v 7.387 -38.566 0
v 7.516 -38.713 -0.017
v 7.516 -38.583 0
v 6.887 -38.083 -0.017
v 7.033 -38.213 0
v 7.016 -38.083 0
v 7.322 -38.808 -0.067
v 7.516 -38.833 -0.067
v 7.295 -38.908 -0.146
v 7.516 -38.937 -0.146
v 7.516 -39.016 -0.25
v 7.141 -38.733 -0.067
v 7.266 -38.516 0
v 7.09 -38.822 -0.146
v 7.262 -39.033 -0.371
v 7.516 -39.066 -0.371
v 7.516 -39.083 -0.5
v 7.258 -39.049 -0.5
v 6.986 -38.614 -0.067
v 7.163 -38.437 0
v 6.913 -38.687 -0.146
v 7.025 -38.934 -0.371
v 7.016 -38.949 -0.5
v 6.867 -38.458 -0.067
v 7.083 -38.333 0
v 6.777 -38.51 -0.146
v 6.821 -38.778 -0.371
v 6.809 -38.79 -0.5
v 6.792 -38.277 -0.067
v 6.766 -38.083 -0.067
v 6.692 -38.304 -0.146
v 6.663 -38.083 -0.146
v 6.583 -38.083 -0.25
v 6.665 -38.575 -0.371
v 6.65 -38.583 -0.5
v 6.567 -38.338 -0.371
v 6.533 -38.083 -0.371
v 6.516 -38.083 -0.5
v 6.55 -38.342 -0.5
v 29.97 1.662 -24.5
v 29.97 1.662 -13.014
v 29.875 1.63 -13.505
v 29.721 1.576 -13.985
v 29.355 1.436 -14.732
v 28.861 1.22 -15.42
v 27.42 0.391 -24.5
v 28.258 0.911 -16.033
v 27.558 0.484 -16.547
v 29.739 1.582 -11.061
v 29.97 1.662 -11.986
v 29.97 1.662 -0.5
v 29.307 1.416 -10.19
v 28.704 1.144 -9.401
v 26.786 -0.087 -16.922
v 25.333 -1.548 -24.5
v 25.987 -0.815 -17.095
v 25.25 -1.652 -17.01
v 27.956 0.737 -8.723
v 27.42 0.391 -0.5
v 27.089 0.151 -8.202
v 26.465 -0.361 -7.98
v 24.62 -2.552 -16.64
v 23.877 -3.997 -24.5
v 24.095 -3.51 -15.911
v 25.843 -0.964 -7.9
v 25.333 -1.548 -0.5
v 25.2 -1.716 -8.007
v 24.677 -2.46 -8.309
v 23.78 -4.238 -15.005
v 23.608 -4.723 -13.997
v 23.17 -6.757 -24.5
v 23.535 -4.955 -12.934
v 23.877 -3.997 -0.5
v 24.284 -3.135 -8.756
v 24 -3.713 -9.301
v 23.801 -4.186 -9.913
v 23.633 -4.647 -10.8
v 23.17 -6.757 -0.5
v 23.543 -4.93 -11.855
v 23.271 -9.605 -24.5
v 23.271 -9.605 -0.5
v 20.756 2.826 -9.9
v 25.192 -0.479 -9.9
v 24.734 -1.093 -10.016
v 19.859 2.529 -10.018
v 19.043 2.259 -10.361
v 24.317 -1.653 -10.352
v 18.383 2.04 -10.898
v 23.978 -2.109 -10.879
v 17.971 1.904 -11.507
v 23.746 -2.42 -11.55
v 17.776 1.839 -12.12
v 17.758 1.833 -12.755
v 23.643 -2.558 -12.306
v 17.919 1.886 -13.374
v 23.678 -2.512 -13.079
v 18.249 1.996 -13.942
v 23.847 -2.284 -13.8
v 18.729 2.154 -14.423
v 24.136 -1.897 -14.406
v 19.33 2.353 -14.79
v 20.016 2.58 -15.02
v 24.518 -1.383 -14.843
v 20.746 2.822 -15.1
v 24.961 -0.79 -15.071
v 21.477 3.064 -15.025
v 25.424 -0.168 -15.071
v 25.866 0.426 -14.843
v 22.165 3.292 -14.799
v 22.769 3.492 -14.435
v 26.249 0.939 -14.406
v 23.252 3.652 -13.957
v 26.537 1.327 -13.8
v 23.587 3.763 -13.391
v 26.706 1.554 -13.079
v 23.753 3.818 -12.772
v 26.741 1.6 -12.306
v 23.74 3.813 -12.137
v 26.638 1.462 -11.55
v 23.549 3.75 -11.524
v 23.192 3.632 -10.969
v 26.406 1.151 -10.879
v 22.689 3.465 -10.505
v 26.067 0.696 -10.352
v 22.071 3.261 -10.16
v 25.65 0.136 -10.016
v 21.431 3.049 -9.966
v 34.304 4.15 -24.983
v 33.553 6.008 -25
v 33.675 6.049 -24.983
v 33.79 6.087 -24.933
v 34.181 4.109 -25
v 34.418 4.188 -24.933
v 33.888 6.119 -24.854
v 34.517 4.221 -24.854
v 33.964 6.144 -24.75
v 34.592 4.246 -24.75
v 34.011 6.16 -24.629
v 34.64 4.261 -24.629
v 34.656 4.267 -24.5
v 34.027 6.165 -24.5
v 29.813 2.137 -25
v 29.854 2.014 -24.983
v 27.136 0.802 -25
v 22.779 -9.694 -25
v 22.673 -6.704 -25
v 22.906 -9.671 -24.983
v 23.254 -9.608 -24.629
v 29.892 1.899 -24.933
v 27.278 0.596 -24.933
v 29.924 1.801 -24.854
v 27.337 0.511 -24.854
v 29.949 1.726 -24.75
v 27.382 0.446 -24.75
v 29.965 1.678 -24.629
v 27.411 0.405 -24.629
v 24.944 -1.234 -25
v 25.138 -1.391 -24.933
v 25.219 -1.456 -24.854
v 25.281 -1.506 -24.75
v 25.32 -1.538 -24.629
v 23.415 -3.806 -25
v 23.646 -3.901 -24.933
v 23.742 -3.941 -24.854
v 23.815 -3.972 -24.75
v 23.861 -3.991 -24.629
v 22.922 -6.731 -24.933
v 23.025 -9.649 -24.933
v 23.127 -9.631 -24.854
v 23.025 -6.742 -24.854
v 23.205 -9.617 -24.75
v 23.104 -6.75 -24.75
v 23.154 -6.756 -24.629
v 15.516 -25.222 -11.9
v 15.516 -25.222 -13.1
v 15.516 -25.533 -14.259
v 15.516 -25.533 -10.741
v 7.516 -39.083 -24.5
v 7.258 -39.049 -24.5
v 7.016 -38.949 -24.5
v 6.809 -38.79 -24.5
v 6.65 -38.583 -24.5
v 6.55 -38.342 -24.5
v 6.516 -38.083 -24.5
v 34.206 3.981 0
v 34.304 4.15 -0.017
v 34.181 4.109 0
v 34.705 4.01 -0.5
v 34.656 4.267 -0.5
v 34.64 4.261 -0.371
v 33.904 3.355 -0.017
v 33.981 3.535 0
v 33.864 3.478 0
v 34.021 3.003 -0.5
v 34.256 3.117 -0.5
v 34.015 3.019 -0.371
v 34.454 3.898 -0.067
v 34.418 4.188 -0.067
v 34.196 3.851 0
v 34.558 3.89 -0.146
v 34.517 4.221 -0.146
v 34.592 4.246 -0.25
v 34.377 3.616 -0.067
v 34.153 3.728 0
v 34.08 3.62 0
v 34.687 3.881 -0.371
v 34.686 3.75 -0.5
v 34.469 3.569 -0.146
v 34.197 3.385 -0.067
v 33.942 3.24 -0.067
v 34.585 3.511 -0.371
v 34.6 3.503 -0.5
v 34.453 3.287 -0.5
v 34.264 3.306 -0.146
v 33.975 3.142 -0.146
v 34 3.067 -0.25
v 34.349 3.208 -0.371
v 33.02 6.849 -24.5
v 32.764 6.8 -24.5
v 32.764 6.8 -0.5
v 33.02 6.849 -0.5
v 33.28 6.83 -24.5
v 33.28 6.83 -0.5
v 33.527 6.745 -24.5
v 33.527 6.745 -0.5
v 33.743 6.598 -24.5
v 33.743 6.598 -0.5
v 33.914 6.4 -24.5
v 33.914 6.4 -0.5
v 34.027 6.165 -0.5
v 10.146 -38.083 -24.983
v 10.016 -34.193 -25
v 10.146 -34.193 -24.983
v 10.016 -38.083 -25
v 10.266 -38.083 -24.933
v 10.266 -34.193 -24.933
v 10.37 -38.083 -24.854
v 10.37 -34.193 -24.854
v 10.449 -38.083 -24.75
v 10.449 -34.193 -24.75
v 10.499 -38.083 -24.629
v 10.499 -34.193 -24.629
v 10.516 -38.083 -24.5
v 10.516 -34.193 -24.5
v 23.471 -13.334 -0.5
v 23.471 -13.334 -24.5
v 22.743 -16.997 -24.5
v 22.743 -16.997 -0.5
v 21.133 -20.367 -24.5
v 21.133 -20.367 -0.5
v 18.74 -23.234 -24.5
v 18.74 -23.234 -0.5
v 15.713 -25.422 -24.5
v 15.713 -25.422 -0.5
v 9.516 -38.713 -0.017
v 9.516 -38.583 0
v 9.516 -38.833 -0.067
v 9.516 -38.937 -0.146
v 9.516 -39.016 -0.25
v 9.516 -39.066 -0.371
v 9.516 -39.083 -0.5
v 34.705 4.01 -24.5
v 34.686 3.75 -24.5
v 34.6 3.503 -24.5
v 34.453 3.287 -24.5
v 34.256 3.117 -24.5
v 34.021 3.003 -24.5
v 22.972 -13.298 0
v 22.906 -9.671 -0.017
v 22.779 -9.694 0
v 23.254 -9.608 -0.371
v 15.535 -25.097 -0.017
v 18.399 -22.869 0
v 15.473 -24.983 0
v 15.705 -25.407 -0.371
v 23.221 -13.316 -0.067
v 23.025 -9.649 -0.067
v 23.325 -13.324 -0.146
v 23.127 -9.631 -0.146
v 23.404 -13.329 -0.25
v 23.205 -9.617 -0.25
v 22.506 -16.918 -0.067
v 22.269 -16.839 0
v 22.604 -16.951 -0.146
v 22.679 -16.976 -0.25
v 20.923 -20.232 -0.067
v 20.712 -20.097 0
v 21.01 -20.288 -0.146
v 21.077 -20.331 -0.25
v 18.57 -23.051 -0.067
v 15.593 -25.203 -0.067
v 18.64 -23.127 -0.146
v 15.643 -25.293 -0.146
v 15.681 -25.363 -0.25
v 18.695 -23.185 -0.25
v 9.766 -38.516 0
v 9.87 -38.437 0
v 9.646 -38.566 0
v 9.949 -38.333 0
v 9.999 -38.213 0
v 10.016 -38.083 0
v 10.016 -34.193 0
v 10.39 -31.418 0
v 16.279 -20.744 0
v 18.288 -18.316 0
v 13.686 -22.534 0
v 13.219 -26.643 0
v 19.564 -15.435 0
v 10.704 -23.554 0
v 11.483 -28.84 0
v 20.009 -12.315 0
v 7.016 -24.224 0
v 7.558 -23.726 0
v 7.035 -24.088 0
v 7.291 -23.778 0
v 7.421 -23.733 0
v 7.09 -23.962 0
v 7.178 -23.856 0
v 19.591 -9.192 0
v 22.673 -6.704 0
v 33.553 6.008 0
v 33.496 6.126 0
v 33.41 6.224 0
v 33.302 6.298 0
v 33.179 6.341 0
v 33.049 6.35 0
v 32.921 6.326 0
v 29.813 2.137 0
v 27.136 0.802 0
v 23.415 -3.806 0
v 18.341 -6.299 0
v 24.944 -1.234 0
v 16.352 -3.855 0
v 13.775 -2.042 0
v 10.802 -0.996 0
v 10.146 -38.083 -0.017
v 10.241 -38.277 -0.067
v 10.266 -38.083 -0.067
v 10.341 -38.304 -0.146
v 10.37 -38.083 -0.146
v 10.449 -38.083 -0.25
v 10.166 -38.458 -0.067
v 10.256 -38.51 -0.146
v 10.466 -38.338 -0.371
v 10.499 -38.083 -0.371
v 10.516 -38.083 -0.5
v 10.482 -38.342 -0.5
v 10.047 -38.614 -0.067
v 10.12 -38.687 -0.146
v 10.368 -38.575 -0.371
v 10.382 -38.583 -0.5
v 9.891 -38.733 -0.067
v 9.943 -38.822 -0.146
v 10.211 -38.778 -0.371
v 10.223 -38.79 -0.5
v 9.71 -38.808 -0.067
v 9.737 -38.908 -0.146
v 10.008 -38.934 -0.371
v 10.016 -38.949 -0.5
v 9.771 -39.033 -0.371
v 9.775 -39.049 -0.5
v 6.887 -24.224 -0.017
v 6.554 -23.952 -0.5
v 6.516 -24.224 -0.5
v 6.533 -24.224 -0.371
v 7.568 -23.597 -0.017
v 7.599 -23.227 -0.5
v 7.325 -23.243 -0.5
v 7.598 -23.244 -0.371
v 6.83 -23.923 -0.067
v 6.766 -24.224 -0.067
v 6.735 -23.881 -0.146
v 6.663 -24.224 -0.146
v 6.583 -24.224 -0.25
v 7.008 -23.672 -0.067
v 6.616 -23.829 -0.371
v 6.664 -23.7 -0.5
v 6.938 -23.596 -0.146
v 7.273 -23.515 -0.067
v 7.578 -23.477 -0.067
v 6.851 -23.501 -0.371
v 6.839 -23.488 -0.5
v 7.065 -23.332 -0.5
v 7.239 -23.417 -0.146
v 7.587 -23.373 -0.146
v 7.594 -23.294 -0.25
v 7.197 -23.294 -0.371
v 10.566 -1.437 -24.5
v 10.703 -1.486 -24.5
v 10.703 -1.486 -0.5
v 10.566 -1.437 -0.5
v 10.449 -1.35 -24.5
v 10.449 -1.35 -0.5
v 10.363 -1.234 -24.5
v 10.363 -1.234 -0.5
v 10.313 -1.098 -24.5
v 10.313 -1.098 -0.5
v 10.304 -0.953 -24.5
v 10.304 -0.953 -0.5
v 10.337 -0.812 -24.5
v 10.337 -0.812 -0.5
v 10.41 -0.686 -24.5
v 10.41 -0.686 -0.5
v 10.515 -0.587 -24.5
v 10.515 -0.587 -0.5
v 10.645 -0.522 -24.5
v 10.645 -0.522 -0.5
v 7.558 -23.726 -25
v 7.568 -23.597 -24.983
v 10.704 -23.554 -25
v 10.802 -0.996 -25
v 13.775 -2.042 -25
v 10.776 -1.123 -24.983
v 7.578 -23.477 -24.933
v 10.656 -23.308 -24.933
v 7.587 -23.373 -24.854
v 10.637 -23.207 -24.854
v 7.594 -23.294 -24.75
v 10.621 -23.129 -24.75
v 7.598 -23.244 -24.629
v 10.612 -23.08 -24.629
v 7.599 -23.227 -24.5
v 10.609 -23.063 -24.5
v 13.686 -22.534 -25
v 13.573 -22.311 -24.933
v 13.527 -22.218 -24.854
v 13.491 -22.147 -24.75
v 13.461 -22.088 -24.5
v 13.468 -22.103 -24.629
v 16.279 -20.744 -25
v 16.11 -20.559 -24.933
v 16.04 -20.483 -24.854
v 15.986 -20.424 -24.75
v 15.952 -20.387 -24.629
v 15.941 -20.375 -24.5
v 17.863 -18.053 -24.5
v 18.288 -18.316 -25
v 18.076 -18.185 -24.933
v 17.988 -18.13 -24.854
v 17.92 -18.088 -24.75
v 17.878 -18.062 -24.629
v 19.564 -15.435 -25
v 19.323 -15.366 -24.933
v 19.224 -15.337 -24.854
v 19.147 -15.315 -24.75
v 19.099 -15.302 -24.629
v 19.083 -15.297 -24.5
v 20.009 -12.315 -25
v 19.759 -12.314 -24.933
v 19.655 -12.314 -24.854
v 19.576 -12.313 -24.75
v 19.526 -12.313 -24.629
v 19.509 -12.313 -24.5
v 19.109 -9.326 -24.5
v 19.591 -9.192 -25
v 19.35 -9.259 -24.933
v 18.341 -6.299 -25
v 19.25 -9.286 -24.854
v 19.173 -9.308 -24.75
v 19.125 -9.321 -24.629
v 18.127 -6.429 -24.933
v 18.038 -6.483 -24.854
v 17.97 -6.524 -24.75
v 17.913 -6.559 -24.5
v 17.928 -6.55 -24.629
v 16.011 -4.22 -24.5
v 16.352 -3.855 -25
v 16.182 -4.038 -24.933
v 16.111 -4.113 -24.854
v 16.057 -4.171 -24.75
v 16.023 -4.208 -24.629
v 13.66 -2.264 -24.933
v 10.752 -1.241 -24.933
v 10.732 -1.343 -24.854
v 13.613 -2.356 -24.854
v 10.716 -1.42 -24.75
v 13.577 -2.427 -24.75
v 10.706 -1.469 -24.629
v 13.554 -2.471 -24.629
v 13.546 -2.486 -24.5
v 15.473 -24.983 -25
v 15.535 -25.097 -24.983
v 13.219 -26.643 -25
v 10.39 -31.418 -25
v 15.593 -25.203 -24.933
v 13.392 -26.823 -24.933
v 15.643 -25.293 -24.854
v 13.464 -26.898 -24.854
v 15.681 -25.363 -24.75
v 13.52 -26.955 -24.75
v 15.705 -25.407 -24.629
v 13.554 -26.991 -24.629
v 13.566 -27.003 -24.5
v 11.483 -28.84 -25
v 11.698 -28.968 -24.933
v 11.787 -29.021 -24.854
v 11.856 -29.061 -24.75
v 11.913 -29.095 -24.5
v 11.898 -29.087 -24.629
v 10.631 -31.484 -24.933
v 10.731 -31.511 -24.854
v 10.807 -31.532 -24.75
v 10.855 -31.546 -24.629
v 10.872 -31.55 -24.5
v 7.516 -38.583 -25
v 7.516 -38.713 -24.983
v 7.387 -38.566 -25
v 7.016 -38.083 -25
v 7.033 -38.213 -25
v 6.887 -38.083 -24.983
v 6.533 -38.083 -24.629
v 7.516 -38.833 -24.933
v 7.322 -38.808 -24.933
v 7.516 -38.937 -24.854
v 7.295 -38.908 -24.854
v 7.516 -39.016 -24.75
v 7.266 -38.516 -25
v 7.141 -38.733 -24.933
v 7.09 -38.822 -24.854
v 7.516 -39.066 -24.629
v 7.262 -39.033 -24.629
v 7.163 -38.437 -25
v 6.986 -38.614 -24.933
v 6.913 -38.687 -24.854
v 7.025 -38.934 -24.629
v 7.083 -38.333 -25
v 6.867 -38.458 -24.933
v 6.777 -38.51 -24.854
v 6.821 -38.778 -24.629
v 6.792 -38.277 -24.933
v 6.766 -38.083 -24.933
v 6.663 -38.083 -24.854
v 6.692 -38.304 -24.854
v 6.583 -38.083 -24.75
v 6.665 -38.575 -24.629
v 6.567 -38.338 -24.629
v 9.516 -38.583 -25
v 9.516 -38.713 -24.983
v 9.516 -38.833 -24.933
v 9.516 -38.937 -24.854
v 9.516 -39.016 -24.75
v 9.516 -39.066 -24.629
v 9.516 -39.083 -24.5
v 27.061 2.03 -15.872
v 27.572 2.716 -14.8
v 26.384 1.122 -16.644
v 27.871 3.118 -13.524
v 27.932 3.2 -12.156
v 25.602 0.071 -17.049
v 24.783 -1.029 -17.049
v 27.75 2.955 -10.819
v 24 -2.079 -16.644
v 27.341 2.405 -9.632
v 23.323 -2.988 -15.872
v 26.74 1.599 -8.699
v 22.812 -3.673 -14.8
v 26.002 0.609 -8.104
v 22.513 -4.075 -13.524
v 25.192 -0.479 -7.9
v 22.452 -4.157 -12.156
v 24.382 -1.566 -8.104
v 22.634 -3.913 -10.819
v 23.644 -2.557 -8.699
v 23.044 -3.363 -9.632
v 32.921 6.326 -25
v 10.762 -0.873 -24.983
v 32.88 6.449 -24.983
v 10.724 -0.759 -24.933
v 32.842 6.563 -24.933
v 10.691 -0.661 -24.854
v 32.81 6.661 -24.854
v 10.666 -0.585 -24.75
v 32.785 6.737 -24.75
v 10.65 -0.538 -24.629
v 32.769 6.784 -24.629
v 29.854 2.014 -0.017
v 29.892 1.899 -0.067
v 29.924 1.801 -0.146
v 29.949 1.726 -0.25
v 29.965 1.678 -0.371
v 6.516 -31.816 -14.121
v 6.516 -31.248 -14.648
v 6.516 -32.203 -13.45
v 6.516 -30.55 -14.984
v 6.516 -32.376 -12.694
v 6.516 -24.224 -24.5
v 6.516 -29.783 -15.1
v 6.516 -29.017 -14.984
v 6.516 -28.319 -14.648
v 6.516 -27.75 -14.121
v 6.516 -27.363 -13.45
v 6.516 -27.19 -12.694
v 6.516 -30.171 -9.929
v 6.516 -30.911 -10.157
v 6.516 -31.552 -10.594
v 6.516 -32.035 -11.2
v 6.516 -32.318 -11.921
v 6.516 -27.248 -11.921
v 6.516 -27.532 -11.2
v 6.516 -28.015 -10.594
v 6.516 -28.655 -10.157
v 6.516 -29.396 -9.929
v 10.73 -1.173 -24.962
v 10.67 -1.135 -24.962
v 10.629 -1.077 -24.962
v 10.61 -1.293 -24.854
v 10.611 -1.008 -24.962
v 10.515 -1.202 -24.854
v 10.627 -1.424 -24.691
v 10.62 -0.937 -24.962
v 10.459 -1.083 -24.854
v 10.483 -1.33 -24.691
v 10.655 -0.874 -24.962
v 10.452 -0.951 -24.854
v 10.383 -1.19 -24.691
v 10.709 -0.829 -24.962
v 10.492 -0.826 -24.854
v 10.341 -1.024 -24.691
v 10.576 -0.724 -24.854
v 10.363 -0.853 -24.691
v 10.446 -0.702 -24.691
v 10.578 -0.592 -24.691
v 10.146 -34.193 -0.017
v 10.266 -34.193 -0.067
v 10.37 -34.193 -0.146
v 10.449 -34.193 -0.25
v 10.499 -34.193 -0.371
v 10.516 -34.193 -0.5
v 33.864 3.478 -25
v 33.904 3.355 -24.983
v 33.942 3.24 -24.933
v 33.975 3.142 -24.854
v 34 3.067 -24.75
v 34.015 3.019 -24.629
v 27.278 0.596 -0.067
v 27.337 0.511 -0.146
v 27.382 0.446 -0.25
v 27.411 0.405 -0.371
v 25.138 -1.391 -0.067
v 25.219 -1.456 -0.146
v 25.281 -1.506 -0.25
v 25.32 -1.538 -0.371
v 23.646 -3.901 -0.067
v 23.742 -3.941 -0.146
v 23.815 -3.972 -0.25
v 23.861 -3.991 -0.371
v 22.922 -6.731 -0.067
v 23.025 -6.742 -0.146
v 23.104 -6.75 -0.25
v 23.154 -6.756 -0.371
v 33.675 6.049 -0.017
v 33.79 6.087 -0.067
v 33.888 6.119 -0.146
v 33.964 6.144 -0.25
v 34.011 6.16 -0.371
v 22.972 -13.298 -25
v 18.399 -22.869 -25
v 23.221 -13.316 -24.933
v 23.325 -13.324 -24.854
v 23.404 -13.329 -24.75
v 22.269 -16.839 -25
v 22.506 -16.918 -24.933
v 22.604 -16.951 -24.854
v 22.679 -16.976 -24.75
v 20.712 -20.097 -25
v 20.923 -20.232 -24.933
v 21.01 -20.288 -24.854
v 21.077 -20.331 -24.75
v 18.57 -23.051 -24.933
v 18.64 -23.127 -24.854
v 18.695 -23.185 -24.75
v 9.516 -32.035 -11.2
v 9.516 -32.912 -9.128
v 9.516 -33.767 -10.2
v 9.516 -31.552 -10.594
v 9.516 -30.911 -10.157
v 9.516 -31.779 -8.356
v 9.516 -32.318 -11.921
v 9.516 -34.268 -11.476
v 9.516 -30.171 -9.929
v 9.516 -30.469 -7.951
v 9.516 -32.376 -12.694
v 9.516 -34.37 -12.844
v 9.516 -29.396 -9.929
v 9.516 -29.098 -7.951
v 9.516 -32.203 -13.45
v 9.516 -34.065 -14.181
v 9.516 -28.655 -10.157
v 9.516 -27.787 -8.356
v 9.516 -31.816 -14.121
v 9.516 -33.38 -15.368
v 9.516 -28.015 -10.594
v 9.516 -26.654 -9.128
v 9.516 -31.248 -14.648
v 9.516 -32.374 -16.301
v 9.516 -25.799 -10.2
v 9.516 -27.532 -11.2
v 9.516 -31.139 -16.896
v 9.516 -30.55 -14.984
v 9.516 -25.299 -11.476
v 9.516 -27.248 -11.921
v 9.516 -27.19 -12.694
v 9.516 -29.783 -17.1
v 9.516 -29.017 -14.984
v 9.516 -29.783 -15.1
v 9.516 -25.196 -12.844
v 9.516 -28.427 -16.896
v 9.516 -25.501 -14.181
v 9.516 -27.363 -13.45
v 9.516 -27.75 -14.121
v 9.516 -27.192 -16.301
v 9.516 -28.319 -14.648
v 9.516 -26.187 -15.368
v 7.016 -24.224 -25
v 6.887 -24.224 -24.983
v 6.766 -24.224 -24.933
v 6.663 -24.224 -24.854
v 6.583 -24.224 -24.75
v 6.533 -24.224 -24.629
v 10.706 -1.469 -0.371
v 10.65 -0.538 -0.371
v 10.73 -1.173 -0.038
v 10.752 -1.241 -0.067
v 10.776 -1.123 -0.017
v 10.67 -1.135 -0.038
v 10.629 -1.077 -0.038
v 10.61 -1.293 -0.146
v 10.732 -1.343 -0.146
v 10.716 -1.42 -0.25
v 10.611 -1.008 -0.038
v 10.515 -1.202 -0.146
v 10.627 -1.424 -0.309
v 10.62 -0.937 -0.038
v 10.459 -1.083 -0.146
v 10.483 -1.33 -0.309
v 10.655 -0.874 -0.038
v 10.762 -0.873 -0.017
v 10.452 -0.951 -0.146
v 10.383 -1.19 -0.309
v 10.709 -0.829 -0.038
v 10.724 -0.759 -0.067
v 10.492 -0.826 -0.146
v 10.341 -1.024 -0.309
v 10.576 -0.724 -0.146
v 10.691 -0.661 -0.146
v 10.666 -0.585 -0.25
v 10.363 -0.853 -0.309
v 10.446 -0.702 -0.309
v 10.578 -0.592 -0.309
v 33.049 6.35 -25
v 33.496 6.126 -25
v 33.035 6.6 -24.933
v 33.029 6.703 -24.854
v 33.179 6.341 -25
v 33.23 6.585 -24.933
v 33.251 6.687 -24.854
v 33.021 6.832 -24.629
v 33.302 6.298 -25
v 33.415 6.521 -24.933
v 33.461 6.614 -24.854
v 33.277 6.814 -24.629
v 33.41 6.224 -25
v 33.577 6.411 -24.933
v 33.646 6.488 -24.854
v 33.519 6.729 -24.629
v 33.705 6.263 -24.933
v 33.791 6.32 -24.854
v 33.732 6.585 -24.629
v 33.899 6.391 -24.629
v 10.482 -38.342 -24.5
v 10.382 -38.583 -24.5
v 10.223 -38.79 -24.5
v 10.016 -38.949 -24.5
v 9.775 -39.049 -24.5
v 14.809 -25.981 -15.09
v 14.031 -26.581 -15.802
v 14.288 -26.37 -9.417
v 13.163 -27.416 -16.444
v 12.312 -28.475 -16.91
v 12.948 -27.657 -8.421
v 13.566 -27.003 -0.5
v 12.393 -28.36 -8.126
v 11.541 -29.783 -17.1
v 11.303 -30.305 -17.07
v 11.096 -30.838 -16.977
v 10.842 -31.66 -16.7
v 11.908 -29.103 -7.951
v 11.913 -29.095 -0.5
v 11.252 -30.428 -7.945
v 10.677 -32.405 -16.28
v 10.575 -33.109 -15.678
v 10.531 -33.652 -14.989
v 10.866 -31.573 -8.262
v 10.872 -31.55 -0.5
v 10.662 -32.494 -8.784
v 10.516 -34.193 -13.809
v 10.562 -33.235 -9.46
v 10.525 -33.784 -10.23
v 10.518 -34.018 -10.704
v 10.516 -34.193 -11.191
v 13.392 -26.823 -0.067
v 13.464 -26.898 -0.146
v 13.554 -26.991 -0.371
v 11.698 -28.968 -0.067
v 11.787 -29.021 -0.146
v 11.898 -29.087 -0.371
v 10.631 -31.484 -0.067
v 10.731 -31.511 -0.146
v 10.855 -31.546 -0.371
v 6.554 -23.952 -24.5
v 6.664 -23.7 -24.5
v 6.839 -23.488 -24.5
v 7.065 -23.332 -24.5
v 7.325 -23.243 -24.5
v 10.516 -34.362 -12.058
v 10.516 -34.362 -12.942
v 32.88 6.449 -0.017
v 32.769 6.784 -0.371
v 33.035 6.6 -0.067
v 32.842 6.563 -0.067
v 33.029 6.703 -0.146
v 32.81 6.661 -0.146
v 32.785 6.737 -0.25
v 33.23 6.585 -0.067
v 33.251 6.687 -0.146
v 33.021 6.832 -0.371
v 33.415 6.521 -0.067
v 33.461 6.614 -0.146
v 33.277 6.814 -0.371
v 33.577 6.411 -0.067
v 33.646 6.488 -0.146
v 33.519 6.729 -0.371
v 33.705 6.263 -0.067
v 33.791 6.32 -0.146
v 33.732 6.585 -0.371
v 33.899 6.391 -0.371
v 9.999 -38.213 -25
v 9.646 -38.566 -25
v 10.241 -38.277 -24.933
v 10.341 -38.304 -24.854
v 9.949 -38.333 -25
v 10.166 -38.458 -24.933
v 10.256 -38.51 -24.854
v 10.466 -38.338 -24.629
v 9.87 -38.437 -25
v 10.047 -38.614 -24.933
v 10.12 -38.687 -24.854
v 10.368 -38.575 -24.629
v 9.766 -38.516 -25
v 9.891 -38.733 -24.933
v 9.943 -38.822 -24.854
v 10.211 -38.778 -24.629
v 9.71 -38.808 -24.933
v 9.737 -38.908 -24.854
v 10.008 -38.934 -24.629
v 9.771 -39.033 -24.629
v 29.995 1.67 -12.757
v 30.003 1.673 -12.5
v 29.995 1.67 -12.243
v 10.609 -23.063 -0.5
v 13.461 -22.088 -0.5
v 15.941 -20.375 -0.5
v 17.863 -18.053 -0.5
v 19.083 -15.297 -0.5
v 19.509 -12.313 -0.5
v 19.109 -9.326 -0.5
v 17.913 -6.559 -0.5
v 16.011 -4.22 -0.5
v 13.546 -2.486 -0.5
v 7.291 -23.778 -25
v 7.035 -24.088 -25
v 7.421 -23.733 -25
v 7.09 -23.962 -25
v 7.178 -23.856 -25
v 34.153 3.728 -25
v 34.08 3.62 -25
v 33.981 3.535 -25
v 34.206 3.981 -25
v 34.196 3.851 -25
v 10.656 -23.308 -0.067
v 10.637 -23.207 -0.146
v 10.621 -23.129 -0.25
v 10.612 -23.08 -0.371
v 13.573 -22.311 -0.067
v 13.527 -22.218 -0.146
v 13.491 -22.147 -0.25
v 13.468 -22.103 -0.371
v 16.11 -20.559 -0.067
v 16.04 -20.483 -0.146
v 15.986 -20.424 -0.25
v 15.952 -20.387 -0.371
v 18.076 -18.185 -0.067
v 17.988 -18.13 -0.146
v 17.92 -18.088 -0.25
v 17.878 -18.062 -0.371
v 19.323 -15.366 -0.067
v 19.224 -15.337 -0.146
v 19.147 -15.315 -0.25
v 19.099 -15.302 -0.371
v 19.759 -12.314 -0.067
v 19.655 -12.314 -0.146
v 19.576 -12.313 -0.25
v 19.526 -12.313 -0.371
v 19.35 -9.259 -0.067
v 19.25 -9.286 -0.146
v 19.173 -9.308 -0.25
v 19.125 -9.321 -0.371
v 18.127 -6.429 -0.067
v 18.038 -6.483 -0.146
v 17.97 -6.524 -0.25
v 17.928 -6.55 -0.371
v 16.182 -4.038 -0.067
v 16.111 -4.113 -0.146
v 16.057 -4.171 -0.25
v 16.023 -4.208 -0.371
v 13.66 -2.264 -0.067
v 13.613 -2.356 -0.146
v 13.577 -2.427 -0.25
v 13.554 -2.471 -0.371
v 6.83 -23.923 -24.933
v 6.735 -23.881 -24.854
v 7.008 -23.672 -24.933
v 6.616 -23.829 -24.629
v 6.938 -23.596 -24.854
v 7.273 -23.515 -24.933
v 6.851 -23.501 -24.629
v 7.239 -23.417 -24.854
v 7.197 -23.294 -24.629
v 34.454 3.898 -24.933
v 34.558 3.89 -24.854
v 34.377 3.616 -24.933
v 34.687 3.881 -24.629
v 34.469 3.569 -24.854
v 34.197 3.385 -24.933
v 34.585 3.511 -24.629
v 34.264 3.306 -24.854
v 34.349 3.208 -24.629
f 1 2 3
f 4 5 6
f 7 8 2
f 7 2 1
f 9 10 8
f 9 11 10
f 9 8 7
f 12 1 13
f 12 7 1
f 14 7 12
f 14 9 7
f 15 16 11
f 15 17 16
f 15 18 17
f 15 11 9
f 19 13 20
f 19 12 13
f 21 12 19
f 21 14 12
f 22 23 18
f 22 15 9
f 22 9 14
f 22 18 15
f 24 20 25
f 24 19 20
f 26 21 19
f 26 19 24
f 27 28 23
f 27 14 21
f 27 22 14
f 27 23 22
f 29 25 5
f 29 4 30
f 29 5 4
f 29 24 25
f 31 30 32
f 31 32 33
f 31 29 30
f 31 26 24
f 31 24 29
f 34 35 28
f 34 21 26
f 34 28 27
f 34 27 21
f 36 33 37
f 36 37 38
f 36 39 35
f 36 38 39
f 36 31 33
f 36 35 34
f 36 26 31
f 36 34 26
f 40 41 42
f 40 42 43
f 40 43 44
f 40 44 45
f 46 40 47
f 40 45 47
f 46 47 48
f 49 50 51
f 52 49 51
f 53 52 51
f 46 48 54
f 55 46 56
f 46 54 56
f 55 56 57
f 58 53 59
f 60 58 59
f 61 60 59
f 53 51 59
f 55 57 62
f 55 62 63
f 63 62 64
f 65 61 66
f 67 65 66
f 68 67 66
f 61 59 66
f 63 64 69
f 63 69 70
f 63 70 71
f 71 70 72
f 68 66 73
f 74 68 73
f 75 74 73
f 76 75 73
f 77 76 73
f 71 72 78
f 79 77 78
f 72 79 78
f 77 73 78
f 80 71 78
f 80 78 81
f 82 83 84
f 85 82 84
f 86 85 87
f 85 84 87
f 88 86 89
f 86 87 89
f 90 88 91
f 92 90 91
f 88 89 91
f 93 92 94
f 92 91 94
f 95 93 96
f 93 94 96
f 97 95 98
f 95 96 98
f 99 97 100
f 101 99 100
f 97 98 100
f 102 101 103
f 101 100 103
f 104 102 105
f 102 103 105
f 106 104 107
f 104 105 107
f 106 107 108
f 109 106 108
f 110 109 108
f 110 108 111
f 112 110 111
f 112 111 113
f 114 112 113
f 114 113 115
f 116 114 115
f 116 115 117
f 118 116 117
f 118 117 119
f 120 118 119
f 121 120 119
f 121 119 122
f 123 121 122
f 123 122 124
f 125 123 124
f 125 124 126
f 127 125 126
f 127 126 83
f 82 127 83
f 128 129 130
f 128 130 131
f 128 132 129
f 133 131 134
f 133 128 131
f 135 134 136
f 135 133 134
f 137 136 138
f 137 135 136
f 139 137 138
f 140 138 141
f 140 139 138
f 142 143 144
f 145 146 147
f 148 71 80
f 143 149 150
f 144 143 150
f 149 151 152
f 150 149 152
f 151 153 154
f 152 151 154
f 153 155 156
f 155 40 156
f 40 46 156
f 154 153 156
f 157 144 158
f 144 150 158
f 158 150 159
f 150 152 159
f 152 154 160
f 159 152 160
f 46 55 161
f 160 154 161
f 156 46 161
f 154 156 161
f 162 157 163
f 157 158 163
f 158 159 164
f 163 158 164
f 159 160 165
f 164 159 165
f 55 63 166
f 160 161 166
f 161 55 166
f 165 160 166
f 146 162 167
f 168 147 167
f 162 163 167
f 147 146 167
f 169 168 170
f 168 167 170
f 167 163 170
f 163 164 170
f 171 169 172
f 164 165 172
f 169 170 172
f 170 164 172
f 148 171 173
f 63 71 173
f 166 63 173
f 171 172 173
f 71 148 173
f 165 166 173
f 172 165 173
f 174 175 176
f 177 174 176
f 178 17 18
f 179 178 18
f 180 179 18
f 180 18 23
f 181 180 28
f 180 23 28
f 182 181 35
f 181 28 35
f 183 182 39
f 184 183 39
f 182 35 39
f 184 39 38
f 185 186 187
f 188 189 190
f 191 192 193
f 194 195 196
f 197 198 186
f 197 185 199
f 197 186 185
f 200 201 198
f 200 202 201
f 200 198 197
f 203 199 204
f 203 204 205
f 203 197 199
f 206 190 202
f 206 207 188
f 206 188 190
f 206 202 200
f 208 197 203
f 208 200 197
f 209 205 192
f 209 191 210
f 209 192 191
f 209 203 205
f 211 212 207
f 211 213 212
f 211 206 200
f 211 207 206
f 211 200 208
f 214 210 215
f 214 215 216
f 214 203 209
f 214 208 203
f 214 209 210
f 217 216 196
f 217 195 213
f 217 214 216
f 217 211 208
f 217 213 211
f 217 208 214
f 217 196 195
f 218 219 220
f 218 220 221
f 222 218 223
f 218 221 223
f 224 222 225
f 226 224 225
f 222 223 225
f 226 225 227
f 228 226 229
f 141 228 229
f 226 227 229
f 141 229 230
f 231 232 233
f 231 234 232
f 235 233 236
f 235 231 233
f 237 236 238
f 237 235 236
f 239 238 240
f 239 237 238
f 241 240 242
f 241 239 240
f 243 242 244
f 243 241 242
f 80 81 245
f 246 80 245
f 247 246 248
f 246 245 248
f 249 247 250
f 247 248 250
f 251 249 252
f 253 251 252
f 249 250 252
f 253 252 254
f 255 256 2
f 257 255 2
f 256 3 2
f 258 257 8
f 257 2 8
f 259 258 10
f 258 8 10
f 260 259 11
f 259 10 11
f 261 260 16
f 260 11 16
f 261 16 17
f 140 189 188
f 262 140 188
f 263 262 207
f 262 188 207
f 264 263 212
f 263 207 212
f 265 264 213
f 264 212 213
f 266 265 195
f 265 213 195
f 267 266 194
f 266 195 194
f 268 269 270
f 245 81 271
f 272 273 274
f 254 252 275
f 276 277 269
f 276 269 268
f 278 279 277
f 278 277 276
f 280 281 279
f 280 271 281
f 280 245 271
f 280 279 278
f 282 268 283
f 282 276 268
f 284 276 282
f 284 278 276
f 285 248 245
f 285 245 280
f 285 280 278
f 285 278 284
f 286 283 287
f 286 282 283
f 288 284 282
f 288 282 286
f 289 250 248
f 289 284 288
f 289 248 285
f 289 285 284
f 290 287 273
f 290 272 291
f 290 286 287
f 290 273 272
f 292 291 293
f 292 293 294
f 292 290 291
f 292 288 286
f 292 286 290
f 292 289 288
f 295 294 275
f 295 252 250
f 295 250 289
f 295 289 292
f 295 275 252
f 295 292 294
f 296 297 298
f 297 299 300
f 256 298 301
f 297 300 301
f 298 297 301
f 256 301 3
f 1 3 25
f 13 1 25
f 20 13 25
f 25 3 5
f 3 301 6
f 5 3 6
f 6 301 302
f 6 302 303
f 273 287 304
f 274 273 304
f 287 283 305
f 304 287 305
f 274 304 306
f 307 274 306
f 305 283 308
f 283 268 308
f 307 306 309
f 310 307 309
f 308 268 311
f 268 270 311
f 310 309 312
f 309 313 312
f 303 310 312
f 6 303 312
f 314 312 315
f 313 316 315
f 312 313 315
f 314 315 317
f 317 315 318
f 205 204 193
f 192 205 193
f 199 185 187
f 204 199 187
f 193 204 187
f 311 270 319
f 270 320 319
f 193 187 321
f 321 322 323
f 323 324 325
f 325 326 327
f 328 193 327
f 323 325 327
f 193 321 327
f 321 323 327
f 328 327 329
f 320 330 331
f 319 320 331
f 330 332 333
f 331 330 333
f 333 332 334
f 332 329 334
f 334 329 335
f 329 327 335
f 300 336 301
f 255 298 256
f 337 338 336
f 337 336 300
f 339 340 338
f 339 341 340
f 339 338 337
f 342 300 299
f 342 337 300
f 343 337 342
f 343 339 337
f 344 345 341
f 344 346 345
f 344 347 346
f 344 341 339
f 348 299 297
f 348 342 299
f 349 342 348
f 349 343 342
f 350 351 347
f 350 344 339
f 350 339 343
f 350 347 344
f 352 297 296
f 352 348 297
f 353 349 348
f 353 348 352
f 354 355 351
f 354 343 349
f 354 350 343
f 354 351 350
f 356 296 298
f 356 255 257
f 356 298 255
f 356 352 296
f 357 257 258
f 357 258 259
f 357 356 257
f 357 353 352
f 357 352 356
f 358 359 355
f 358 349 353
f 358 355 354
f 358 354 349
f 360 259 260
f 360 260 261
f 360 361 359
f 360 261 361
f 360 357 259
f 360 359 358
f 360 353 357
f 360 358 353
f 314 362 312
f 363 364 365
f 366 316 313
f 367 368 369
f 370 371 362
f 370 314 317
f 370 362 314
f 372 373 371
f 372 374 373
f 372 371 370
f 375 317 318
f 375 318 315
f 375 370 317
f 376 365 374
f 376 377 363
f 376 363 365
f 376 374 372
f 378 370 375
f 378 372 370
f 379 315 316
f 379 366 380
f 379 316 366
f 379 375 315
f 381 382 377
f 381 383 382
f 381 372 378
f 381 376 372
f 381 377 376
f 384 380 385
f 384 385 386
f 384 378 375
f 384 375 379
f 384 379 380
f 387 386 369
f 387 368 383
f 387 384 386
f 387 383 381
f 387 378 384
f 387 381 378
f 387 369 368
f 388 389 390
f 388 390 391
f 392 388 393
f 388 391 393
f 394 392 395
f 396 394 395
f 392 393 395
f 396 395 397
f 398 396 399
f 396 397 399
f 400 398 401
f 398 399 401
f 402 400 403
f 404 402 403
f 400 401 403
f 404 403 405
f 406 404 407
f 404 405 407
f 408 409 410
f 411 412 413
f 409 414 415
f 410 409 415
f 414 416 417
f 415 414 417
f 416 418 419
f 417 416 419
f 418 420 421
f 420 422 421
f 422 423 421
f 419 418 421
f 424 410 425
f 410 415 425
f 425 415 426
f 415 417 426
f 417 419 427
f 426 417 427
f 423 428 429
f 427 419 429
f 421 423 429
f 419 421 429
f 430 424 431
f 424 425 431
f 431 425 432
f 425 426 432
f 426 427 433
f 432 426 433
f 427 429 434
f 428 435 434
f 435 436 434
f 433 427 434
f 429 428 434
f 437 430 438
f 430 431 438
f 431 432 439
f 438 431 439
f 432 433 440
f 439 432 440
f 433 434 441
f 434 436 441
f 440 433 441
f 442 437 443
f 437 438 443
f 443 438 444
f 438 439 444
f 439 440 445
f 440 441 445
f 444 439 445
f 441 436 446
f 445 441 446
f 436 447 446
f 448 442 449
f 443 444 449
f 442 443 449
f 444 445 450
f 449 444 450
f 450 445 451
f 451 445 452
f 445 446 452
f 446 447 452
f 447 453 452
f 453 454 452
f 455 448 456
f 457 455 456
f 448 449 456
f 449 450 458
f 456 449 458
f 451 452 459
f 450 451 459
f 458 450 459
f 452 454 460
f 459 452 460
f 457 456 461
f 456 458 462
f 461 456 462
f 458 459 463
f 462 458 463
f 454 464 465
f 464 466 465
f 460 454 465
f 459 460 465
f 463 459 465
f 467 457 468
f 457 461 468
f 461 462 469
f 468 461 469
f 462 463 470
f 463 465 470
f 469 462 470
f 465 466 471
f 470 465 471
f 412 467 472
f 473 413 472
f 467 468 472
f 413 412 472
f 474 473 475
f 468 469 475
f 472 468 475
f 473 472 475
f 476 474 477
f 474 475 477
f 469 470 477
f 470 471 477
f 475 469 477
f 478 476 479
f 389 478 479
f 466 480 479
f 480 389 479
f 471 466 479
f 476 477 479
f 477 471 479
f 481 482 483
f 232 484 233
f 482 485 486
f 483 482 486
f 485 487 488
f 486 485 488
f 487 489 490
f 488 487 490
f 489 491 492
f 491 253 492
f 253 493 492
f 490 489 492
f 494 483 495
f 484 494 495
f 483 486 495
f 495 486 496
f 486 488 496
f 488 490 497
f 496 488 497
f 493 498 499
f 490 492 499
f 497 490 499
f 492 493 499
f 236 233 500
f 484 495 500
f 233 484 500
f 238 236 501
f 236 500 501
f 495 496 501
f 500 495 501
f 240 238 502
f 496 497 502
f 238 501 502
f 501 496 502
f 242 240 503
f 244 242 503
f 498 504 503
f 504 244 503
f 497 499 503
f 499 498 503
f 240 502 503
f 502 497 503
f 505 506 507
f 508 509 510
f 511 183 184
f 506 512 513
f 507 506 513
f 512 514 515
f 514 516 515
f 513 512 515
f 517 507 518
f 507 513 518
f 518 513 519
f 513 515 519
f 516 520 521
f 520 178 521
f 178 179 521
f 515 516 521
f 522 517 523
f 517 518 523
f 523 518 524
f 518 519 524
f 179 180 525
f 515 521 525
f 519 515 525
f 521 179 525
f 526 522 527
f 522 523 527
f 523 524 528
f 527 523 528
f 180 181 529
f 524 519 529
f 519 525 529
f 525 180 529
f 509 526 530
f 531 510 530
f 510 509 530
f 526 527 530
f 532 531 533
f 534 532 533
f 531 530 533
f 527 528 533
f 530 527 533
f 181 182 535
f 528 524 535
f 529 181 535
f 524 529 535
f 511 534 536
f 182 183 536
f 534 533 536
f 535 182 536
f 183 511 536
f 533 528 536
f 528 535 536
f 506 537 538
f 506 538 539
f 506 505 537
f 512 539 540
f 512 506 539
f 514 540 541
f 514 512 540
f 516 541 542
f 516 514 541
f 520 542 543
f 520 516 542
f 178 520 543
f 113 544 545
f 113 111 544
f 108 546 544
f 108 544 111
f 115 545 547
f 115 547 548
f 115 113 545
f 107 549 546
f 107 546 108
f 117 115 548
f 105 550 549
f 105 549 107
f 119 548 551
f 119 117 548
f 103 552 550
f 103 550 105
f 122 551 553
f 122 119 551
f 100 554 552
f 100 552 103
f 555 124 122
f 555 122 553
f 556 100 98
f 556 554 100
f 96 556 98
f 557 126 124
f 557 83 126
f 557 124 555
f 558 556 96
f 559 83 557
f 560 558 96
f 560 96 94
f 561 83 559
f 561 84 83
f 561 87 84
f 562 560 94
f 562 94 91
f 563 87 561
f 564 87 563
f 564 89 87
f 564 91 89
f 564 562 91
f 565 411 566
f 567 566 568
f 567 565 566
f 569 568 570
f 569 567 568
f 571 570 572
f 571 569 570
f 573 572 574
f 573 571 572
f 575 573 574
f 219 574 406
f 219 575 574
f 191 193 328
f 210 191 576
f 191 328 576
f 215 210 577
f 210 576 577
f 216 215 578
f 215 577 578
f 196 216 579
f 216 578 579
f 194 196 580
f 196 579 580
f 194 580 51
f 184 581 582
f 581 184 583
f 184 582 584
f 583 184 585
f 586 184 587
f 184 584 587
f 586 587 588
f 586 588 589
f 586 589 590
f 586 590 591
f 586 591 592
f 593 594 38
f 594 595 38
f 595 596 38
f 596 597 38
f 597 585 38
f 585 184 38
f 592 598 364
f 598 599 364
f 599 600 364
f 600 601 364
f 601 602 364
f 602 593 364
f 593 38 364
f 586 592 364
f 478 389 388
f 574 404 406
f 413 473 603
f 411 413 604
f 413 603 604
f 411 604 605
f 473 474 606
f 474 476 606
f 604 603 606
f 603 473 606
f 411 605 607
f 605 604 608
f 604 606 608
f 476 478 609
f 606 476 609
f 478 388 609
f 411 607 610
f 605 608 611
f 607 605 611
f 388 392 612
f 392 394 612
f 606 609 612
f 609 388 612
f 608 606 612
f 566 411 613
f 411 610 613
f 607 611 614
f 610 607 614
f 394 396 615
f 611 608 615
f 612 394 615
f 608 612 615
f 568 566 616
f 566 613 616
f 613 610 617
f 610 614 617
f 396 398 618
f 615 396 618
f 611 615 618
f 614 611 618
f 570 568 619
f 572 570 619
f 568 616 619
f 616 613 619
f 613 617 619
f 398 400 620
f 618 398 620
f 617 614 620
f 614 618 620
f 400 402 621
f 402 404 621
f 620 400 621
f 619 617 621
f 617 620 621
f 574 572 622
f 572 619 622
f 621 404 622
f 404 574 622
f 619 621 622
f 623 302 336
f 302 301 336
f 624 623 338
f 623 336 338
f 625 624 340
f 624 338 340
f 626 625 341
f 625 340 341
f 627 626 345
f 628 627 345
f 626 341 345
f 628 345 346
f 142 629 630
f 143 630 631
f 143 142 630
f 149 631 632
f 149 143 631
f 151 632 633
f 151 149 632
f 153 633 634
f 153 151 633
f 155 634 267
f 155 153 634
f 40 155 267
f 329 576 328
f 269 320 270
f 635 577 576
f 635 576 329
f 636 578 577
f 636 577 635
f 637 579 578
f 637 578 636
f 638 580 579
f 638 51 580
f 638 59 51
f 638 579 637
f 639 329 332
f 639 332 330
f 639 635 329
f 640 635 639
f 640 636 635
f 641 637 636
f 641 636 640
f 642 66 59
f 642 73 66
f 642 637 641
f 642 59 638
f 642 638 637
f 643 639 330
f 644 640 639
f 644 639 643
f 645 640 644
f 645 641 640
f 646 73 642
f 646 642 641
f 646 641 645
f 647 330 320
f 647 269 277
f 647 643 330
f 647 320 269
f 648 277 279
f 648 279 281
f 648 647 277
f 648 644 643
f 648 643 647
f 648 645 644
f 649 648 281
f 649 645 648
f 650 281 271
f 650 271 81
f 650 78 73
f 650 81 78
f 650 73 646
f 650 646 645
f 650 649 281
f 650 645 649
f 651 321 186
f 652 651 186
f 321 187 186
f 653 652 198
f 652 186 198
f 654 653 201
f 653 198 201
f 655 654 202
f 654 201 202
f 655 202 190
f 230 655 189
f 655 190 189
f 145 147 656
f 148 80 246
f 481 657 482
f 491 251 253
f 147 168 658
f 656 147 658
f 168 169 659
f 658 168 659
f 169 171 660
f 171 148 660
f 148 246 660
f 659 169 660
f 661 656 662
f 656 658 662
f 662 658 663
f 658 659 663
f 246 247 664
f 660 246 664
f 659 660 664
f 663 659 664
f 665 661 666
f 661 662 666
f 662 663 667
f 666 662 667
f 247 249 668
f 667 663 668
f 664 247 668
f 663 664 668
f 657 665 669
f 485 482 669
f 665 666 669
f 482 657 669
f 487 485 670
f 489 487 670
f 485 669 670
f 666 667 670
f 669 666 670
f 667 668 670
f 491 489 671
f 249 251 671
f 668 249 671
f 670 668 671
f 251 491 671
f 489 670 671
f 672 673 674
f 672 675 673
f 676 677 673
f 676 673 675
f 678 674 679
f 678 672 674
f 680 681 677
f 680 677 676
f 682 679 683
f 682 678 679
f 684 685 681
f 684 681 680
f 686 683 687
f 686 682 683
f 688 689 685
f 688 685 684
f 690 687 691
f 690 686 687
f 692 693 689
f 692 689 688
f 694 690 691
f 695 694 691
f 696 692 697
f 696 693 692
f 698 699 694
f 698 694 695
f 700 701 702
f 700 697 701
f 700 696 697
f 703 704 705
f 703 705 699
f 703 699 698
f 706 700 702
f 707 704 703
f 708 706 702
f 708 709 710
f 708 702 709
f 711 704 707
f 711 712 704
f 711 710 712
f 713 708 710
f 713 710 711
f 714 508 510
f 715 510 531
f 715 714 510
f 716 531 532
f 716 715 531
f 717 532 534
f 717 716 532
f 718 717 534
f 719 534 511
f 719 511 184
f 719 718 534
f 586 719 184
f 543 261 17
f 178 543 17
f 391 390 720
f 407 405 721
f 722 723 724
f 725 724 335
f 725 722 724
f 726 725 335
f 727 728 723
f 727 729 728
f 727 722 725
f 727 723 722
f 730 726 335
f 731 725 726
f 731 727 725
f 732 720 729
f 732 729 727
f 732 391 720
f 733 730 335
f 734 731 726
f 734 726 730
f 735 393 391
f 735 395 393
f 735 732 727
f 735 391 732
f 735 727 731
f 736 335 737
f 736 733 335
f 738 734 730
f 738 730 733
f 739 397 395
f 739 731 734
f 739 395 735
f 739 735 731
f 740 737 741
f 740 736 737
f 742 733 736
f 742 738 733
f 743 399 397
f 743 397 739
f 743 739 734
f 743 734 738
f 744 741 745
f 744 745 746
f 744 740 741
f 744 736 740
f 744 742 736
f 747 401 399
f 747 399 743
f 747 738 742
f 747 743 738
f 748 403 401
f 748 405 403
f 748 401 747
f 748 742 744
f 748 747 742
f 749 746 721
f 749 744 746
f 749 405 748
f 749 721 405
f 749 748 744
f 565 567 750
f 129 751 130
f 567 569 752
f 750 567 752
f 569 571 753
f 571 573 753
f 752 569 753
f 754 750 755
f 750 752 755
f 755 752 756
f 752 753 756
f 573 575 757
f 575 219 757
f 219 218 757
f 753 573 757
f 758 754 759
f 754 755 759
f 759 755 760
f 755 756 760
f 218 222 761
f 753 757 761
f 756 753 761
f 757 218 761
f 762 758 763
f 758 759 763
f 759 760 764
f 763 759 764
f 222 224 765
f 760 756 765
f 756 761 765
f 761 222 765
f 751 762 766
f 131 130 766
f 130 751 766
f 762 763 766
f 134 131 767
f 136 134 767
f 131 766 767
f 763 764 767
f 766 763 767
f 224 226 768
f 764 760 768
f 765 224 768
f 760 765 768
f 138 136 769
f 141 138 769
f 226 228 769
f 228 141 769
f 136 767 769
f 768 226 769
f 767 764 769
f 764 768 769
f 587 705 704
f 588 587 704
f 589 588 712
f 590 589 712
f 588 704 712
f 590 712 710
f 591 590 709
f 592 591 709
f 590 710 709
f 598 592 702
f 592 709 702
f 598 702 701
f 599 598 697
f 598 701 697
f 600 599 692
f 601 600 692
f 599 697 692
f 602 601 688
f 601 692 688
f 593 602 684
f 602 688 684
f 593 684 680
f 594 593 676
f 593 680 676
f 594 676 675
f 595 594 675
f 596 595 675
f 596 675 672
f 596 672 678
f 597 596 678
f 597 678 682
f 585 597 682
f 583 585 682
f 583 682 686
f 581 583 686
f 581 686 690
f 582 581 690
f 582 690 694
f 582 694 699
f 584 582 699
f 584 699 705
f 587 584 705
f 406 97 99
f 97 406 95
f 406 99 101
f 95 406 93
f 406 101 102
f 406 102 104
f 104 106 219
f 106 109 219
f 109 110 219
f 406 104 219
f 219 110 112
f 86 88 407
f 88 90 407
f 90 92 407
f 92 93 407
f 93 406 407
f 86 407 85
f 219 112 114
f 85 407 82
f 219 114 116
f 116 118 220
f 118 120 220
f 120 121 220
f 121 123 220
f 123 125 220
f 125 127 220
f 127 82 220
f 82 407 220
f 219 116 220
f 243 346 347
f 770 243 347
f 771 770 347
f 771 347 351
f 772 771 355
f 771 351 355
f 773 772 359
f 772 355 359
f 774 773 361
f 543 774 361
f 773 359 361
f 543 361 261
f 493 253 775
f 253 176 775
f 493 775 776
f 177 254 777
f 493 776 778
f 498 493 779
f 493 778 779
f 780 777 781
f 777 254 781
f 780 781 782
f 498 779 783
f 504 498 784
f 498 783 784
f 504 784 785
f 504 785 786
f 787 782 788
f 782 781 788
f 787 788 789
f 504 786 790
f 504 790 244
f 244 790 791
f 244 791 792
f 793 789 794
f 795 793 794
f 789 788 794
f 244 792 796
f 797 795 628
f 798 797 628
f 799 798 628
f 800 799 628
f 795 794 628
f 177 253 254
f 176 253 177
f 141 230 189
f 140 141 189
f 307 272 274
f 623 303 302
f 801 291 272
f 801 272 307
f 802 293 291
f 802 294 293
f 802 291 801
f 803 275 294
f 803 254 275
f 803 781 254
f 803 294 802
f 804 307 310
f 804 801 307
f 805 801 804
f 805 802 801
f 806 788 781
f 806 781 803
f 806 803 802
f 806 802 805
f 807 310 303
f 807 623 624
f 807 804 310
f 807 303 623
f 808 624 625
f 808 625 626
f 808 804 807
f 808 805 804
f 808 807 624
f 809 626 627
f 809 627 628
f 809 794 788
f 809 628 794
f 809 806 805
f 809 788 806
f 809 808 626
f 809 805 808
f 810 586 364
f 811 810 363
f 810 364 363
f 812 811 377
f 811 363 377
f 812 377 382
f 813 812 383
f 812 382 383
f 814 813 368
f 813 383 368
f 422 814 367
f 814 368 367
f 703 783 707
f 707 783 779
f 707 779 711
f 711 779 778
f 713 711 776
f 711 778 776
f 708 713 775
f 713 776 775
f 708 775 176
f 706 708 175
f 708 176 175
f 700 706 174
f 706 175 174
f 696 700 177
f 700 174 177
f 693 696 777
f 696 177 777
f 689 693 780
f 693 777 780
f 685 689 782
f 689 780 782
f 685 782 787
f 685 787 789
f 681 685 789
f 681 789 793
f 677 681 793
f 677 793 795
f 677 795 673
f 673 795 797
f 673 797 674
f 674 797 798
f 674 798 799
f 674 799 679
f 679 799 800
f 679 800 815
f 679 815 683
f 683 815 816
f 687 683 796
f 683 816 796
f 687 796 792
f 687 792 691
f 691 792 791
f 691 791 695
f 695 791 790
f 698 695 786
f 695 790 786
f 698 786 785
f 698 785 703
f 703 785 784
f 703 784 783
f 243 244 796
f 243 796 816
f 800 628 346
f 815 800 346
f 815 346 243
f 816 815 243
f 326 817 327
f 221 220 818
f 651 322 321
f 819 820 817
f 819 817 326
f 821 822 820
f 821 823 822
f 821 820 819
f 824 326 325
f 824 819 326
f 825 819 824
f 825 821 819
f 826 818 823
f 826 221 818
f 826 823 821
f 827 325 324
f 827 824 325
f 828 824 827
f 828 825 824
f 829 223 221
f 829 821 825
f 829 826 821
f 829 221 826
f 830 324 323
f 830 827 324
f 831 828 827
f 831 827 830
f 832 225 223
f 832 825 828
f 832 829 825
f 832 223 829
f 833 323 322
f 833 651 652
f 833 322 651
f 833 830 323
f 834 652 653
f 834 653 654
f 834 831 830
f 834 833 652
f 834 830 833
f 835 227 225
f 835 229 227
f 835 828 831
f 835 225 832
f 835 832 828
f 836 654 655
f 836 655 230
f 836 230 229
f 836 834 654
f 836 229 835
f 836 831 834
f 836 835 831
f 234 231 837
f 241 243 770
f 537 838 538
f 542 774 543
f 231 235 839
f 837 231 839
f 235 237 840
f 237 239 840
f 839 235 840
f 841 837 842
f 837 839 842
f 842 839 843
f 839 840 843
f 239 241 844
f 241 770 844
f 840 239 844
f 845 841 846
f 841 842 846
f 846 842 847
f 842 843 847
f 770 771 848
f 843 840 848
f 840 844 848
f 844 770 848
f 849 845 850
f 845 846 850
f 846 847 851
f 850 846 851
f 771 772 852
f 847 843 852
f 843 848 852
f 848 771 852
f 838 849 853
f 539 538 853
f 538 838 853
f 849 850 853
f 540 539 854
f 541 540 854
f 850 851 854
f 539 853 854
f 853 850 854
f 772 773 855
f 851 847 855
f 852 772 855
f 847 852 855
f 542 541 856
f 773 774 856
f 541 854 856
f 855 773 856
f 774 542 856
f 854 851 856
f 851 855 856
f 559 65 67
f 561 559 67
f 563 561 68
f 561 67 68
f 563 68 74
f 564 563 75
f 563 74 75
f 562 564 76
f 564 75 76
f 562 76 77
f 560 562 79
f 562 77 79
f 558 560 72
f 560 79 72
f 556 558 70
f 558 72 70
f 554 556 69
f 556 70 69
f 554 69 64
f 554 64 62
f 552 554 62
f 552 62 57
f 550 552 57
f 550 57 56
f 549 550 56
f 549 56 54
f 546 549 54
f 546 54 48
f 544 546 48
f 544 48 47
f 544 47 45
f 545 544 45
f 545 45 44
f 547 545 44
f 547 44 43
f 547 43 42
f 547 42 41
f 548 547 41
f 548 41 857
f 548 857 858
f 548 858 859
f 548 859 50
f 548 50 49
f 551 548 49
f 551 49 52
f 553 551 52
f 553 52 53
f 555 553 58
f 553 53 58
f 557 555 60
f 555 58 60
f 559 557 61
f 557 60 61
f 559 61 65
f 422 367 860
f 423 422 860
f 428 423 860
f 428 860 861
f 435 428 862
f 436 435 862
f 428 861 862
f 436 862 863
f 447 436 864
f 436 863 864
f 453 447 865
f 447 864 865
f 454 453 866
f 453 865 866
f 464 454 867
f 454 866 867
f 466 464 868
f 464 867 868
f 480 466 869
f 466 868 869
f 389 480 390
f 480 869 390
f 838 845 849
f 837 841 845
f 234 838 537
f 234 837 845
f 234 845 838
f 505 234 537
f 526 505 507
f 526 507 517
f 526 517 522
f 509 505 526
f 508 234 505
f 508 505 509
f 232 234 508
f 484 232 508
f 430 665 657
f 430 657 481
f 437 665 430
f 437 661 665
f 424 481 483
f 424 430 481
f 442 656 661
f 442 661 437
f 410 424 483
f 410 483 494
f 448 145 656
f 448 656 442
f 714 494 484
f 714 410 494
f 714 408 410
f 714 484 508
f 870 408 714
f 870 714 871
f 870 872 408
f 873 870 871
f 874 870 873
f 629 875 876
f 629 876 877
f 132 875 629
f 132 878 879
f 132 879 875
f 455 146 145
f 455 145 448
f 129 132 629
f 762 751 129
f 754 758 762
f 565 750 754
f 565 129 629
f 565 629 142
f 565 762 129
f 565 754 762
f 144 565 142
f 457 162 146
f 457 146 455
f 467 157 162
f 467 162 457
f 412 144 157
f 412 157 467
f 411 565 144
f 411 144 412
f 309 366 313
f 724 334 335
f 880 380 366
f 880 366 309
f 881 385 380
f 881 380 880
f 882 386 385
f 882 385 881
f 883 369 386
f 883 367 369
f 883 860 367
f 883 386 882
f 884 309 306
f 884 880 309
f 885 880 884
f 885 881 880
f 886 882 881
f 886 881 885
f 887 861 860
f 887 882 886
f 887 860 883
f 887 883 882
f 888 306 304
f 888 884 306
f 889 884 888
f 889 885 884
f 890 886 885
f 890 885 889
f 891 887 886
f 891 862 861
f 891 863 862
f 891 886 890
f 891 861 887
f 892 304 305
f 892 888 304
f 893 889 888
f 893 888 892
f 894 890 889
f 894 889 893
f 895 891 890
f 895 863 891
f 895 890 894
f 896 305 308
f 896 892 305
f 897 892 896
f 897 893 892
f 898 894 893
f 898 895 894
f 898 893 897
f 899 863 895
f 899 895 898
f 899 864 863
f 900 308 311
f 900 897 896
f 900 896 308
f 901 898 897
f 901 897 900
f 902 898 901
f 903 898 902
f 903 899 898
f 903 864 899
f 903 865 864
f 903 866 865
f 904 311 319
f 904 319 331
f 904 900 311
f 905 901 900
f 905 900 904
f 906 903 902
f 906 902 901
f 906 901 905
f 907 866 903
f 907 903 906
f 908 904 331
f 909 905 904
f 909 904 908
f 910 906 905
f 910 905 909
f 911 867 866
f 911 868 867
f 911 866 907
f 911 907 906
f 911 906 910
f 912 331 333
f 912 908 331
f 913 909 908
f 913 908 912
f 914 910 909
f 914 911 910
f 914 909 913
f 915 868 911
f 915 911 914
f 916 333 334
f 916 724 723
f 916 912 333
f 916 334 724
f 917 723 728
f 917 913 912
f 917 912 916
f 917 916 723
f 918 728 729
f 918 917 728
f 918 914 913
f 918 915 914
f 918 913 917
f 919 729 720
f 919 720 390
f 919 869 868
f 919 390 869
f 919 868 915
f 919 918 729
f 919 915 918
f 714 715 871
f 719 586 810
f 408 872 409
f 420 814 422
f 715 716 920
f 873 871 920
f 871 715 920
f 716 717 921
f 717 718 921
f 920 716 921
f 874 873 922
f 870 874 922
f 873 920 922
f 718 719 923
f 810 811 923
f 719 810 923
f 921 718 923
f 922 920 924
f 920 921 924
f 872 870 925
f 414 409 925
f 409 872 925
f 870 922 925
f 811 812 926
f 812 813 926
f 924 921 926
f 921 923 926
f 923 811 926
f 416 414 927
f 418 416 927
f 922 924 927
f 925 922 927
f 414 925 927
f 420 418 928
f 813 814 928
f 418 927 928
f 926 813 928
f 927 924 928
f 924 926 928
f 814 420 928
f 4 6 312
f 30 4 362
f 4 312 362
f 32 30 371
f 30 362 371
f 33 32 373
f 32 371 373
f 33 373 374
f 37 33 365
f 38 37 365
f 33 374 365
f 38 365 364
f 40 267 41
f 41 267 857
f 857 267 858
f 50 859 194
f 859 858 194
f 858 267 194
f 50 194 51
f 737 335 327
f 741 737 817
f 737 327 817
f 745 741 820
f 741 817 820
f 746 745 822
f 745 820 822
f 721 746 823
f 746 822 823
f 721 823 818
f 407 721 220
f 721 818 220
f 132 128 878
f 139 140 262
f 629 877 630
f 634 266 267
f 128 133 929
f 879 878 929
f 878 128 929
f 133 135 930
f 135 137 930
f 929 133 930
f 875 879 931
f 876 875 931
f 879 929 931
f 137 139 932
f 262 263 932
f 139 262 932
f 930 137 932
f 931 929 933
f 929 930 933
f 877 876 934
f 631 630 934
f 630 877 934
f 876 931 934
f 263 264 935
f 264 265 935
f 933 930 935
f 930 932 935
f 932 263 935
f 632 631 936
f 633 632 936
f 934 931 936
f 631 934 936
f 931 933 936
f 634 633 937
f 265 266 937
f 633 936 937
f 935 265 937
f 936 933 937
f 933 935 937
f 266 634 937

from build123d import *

# Parameters (mm, degrees)
Y_KSEKLIK_EKSTR_ZYON1_DEPTH = 25
IZIM4_R                     = 2.6
KES_EKSTR_ZYON1_DEPTH       = 9
IZIM5_R                     = 4.6
KES_EKSTR_ZYON2_DEPTH       = 6
IZIM6_R                     = 2.6
KES_EKSTR_ZYON3_DEPTH       = 36.5
IZIM7_R                     = 4.6
KES_EKSTR_ZYON4_DEPTH       = 5
RADYUS1_R                   = 0.5


with BuildPart() as part:
    # Çizim1 → Yükseklik-Ekstrüzyon1 (new body)
    with BuildSketch(Plane.XY):
        with BuildLine():
            Line((6.516322935, -38.083207178), (6.516322935, -24.224071188))
            ThreePointArc((6.516322935, -24.224071188), (6.839093945, -23.488298875), (7.599044726, -23.227498508))
            ThreePointArc((7.599044726, -23.227498508), (19.398597482, -13.819653137), (10.702548541, -1.486132448))
            ThreePointArc((10.702548541, -1.486132448), (10.303139514, -1.025885698), (10.645127383, -0.521505941))
            Line((10.645127383, -0.521505941), (32.763677784, 6.800349322))
            ThreePointArc((32.763677784, 6.800349322), (33.527004842, 6.744508119), (34.027272888, 6.165268687))
            Line((34.027272888, 6.165268687), (34.655787357, 4.266592948))
            ThreePointArc((34.655787357, 4.266592948), (34.599946154, 3.50326589), (34.020706721, 3.002997844))
            Line((34.020706721, 3.002997844), (29.970072893, 1.662125405))
            ThreePointArc((29.970072893, 1.662125405), (24.517159095, -2.720713399), (23.271180913, -9.604831589))
            ThreePointArc((23.271180913, -9.604831589), (22.043278837, -18.732259795), (15.713387532, -25.421816227))
            ThreePointArc((15.713387532, -25.421816227), (11.913144626, -29.095314243), (10.516322935, -34.192894354))
            Line((10.516322935, -34.192894354), (10.516322935, -38.083207178))
            ThreePointArc((10.516322935, -38.083207178), (10.223429716, -38.790313959), (9.516322935, -39.083207178))
            Line((9.516322935, -39.083207178), (7.516322935, -39.083207178))
            ThreePointArc((7.516322935, -39.083207178), (6.809216154, -38.790313959), (6.516322935, -38.083207178))
        make_face()
    extrude(amount=-Y_KSEKLIK_EKSTR_ZYON1_DEPTH)

    # Çizim4 → Kes-Ekstrüzyon1 (cut)
    with BuildSketch(Plane(origin=(15.516322935, 0, 0), x_dir=(0, 0, -1), z_dir=(1, 0, 0))):
        with Locations((12.5, -29.783207178)):
            Circle(IZIM4_R)
    extrude(amount=-KES_EKSTR_ZYON1_DEPTH, mode=Mode.SUBTRACT)

    # Çizim5 → Kes-Ekstrüzyon2 (cut)
    with BuildSketch(Plane(origin=(15.516322935, 0, 0), x_dir=(0, 0, -1), z_dir=(1, 0, 0))):
        with Locations((12.5, -29.783207178)):
            Circle(IZIM5_R)
    extrude(amount=-KES_EKSTR_ZYON2_DEPTH, mode=Mode.SUBTRACT)

    # Çizim6 → Kes-Ekstrüzyon3 (cut)
    with BuildSketch(Plane(origin=(20.440424649, -15.226956818, 0), x_dir=(0, 0, 1), z_dir=(0.801942288, -0.597401512, 0))):
        with Locations((-12.5, -14.66586446)):
            Circle(IZIM6_R)
    extrude(amount=-KES_EKSTR_ZYON3_DEPTH, mode=Mode.SUBTRACT)

    # Çizim7 → Kes-Ekstrüzyon4 (cut)
    with BuildSketch(Plane(origin=(20.440424649, -15.226956818, 0), x_dir=(0, 0, 1), z_dir=(0.801942288, -0.597401512, 0))):
        with Locations((-12.5, -14.66586446)):
            Circle(IZIM7_R)
    extrude(amount=-KES_EKSTR_ZYON4_DEPTH, mode=Mode.SUBTRACT)

    # Radyus1
    radyus1_edges = [part.edges().sort_by_distance(p)[0] for p in [
        (24.517159095, -2.720713399, -25),
        (10.516322935, -36.138050766, 0),
        (10.223429716, -38.790313959, 0),
        (8.516322935, -39.083207178, 0),
        (31.995389807, 2.332561624, -25),
        (6.809216154, -38.790313959, 0),
        (6.516322935, -31.153639183, 0),
        (6.839093945, -23.488298875, 0),
        (19.398597482, -13.819653137, 0),
        (10.303139514, -1.025885698, 0),
        (21.704402584, 3.13942169, 0),
        (33.527004842, 6.744508119, 0),
        (34.341530122, 5.215930817, 0),
        (34.599946154, 3.50326589, 0),
        (31.995389807, 2.332561624, 0),
        (34.599946154, 3.50326589, -25),
        (24.517159095, -2.720713399, 0),
        (22.043278837, -18.732259795, 0),
        (11.913144626, -29.095314243, 0),
        (34.341530122, 5.215930817, -25),
        (33.527004842, 6.744508119, -25),
        (21.704402584, 3.13942169, -25),
        (10.303139514, -1.025885698, -25),
        (19.398597482, -13.819653137, -25),
        (6.839093945, -23.488298875, -25),
        (6.516322935, -31.153639183, -25),
        (11.913144626, -29.095314243, -25),
        (6.809216154, -38.790313959, -25),
        (8.516322935, -39.083207178, -25),
        (10.223429716, -38.790313959, -25),
        (10.516322935, -36.138050766, -25),
        (22.043278837, -18.732259795, -25),
    ]]
    fillet(radyus1_edges, radius=RADYUS1_R)


solid = part.part
